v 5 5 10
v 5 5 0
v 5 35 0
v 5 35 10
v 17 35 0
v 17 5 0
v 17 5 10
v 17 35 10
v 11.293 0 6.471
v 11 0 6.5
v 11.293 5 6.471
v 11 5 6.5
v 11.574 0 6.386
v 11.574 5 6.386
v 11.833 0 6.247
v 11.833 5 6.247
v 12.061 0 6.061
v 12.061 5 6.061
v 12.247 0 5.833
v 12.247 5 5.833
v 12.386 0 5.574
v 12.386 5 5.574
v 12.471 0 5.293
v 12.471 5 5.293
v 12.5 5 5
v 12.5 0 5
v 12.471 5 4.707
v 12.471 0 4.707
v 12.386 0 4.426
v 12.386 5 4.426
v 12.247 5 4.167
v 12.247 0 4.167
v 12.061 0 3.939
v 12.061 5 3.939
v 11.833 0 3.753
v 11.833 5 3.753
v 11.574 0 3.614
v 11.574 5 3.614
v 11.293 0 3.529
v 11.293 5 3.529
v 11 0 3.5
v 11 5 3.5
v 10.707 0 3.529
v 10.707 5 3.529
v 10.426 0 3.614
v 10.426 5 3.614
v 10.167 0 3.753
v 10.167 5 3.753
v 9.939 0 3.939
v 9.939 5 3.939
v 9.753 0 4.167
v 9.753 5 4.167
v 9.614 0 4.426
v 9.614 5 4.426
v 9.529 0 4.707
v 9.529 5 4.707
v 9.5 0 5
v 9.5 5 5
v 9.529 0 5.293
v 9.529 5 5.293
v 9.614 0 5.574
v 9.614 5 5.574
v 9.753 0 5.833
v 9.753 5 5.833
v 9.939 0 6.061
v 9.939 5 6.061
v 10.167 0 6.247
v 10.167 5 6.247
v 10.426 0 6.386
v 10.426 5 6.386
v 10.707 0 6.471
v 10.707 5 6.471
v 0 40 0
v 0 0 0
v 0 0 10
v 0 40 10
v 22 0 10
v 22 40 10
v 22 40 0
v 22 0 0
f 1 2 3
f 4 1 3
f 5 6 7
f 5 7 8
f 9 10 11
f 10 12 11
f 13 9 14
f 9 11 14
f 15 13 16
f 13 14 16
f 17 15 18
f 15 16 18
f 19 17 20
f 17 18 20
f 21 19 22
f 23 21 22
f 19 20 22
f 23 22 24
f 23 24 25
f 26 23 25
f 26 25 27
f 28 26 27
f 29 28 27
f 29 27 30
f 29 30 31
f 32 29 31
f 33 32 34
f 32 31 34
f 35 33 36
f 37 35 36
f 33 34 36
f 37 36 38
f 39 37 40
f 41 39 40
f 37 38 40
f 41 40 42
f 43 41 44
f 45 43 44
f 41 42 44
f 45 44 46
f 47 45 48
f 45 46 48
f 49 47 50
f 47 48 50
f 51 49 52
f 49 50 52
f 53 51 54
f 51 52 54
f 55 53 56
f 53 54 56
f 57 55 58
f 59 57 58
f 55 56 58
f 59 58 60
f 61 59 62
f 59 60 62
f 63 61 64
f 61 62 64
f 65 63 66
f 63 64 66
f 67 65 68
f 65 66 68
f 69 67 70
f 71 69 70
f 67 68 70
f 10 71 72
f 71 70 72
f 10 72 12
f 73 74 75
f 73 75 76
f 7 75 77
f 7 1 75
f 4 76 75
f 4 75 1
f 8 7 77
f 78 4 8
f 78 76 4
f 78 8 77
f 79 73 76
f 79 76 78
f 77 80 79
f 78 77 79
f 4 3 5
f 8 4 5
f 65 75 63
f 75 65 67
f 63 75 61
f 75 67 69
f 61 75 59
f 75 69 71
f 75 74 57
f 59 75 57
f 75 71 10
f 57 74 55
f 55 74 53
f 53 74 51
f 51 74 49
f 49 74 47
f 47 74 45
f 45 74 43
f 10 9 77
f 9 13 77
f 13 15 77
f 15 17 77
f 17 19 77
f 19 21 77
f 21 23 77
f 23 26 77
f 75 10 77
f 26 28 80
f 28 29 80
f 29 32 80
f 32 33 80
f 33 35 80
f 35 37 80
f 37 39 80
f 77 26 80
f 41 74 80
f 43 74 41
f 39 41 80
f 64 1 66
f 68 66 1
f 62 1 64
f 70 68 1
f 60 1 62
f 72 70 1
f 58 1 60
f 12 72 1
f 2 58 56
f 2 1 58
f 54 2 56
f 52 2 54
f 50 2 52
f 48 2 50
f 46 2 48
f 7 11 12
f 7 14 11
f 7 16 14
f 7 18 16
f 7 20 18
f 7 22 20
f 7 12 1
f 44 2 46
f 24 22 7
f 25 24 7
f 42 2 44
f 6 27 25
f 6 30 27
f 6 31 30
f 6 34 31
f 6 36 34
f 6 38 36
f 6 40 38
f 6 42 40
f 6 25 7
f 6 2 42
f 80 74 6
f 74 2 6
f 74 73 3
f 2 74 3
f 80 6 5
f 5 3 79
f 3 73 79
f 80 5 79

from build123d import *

# Parameters (mm, degrees)
SKETCH1_W           = 22
SKETCH1_H           = 40
SKETCH1_W_2         = 12
SKETCH1_H_2         = 30
BOSS_EXTRUDE1_DEPTH = 10
SKETCH2_R           = 1.5
CUT_EXTRUDE1_DEPTH  = 15


with BuildPart() as part:
    # Sketch1 → Boss-Extrude1 (new body)
    with BuildSketch(Plane.XY):
        with Locations((11, 20)):
            Rectangle(SKETCH1_W, SKETCH1_H)
        with Locations((11, 20)):
            Rectangle(SKETCH1_W_2, SKETCH1_H_2, mode=Mode.SUBTRACT)
    extrude(amount=BOSS_EXTRUDE1_DEPTH)

    # Sketch2 → Cut-Extrude1 (cut, symmetric)
    with BuildSketch(Plane(origin=(0, 0, 0), x_dir=(1, 0, 0), z_dir=(0, 1, 0))):
        with Locations(Location((11, -5, 0), (0, 0, 270))):
            Circle(SKETCH2_R)
    extrude(amount=CUT_EXTRUDE1_DEPTH, both=True, mode=Mode.SUBTRACT)


solid = part.part
